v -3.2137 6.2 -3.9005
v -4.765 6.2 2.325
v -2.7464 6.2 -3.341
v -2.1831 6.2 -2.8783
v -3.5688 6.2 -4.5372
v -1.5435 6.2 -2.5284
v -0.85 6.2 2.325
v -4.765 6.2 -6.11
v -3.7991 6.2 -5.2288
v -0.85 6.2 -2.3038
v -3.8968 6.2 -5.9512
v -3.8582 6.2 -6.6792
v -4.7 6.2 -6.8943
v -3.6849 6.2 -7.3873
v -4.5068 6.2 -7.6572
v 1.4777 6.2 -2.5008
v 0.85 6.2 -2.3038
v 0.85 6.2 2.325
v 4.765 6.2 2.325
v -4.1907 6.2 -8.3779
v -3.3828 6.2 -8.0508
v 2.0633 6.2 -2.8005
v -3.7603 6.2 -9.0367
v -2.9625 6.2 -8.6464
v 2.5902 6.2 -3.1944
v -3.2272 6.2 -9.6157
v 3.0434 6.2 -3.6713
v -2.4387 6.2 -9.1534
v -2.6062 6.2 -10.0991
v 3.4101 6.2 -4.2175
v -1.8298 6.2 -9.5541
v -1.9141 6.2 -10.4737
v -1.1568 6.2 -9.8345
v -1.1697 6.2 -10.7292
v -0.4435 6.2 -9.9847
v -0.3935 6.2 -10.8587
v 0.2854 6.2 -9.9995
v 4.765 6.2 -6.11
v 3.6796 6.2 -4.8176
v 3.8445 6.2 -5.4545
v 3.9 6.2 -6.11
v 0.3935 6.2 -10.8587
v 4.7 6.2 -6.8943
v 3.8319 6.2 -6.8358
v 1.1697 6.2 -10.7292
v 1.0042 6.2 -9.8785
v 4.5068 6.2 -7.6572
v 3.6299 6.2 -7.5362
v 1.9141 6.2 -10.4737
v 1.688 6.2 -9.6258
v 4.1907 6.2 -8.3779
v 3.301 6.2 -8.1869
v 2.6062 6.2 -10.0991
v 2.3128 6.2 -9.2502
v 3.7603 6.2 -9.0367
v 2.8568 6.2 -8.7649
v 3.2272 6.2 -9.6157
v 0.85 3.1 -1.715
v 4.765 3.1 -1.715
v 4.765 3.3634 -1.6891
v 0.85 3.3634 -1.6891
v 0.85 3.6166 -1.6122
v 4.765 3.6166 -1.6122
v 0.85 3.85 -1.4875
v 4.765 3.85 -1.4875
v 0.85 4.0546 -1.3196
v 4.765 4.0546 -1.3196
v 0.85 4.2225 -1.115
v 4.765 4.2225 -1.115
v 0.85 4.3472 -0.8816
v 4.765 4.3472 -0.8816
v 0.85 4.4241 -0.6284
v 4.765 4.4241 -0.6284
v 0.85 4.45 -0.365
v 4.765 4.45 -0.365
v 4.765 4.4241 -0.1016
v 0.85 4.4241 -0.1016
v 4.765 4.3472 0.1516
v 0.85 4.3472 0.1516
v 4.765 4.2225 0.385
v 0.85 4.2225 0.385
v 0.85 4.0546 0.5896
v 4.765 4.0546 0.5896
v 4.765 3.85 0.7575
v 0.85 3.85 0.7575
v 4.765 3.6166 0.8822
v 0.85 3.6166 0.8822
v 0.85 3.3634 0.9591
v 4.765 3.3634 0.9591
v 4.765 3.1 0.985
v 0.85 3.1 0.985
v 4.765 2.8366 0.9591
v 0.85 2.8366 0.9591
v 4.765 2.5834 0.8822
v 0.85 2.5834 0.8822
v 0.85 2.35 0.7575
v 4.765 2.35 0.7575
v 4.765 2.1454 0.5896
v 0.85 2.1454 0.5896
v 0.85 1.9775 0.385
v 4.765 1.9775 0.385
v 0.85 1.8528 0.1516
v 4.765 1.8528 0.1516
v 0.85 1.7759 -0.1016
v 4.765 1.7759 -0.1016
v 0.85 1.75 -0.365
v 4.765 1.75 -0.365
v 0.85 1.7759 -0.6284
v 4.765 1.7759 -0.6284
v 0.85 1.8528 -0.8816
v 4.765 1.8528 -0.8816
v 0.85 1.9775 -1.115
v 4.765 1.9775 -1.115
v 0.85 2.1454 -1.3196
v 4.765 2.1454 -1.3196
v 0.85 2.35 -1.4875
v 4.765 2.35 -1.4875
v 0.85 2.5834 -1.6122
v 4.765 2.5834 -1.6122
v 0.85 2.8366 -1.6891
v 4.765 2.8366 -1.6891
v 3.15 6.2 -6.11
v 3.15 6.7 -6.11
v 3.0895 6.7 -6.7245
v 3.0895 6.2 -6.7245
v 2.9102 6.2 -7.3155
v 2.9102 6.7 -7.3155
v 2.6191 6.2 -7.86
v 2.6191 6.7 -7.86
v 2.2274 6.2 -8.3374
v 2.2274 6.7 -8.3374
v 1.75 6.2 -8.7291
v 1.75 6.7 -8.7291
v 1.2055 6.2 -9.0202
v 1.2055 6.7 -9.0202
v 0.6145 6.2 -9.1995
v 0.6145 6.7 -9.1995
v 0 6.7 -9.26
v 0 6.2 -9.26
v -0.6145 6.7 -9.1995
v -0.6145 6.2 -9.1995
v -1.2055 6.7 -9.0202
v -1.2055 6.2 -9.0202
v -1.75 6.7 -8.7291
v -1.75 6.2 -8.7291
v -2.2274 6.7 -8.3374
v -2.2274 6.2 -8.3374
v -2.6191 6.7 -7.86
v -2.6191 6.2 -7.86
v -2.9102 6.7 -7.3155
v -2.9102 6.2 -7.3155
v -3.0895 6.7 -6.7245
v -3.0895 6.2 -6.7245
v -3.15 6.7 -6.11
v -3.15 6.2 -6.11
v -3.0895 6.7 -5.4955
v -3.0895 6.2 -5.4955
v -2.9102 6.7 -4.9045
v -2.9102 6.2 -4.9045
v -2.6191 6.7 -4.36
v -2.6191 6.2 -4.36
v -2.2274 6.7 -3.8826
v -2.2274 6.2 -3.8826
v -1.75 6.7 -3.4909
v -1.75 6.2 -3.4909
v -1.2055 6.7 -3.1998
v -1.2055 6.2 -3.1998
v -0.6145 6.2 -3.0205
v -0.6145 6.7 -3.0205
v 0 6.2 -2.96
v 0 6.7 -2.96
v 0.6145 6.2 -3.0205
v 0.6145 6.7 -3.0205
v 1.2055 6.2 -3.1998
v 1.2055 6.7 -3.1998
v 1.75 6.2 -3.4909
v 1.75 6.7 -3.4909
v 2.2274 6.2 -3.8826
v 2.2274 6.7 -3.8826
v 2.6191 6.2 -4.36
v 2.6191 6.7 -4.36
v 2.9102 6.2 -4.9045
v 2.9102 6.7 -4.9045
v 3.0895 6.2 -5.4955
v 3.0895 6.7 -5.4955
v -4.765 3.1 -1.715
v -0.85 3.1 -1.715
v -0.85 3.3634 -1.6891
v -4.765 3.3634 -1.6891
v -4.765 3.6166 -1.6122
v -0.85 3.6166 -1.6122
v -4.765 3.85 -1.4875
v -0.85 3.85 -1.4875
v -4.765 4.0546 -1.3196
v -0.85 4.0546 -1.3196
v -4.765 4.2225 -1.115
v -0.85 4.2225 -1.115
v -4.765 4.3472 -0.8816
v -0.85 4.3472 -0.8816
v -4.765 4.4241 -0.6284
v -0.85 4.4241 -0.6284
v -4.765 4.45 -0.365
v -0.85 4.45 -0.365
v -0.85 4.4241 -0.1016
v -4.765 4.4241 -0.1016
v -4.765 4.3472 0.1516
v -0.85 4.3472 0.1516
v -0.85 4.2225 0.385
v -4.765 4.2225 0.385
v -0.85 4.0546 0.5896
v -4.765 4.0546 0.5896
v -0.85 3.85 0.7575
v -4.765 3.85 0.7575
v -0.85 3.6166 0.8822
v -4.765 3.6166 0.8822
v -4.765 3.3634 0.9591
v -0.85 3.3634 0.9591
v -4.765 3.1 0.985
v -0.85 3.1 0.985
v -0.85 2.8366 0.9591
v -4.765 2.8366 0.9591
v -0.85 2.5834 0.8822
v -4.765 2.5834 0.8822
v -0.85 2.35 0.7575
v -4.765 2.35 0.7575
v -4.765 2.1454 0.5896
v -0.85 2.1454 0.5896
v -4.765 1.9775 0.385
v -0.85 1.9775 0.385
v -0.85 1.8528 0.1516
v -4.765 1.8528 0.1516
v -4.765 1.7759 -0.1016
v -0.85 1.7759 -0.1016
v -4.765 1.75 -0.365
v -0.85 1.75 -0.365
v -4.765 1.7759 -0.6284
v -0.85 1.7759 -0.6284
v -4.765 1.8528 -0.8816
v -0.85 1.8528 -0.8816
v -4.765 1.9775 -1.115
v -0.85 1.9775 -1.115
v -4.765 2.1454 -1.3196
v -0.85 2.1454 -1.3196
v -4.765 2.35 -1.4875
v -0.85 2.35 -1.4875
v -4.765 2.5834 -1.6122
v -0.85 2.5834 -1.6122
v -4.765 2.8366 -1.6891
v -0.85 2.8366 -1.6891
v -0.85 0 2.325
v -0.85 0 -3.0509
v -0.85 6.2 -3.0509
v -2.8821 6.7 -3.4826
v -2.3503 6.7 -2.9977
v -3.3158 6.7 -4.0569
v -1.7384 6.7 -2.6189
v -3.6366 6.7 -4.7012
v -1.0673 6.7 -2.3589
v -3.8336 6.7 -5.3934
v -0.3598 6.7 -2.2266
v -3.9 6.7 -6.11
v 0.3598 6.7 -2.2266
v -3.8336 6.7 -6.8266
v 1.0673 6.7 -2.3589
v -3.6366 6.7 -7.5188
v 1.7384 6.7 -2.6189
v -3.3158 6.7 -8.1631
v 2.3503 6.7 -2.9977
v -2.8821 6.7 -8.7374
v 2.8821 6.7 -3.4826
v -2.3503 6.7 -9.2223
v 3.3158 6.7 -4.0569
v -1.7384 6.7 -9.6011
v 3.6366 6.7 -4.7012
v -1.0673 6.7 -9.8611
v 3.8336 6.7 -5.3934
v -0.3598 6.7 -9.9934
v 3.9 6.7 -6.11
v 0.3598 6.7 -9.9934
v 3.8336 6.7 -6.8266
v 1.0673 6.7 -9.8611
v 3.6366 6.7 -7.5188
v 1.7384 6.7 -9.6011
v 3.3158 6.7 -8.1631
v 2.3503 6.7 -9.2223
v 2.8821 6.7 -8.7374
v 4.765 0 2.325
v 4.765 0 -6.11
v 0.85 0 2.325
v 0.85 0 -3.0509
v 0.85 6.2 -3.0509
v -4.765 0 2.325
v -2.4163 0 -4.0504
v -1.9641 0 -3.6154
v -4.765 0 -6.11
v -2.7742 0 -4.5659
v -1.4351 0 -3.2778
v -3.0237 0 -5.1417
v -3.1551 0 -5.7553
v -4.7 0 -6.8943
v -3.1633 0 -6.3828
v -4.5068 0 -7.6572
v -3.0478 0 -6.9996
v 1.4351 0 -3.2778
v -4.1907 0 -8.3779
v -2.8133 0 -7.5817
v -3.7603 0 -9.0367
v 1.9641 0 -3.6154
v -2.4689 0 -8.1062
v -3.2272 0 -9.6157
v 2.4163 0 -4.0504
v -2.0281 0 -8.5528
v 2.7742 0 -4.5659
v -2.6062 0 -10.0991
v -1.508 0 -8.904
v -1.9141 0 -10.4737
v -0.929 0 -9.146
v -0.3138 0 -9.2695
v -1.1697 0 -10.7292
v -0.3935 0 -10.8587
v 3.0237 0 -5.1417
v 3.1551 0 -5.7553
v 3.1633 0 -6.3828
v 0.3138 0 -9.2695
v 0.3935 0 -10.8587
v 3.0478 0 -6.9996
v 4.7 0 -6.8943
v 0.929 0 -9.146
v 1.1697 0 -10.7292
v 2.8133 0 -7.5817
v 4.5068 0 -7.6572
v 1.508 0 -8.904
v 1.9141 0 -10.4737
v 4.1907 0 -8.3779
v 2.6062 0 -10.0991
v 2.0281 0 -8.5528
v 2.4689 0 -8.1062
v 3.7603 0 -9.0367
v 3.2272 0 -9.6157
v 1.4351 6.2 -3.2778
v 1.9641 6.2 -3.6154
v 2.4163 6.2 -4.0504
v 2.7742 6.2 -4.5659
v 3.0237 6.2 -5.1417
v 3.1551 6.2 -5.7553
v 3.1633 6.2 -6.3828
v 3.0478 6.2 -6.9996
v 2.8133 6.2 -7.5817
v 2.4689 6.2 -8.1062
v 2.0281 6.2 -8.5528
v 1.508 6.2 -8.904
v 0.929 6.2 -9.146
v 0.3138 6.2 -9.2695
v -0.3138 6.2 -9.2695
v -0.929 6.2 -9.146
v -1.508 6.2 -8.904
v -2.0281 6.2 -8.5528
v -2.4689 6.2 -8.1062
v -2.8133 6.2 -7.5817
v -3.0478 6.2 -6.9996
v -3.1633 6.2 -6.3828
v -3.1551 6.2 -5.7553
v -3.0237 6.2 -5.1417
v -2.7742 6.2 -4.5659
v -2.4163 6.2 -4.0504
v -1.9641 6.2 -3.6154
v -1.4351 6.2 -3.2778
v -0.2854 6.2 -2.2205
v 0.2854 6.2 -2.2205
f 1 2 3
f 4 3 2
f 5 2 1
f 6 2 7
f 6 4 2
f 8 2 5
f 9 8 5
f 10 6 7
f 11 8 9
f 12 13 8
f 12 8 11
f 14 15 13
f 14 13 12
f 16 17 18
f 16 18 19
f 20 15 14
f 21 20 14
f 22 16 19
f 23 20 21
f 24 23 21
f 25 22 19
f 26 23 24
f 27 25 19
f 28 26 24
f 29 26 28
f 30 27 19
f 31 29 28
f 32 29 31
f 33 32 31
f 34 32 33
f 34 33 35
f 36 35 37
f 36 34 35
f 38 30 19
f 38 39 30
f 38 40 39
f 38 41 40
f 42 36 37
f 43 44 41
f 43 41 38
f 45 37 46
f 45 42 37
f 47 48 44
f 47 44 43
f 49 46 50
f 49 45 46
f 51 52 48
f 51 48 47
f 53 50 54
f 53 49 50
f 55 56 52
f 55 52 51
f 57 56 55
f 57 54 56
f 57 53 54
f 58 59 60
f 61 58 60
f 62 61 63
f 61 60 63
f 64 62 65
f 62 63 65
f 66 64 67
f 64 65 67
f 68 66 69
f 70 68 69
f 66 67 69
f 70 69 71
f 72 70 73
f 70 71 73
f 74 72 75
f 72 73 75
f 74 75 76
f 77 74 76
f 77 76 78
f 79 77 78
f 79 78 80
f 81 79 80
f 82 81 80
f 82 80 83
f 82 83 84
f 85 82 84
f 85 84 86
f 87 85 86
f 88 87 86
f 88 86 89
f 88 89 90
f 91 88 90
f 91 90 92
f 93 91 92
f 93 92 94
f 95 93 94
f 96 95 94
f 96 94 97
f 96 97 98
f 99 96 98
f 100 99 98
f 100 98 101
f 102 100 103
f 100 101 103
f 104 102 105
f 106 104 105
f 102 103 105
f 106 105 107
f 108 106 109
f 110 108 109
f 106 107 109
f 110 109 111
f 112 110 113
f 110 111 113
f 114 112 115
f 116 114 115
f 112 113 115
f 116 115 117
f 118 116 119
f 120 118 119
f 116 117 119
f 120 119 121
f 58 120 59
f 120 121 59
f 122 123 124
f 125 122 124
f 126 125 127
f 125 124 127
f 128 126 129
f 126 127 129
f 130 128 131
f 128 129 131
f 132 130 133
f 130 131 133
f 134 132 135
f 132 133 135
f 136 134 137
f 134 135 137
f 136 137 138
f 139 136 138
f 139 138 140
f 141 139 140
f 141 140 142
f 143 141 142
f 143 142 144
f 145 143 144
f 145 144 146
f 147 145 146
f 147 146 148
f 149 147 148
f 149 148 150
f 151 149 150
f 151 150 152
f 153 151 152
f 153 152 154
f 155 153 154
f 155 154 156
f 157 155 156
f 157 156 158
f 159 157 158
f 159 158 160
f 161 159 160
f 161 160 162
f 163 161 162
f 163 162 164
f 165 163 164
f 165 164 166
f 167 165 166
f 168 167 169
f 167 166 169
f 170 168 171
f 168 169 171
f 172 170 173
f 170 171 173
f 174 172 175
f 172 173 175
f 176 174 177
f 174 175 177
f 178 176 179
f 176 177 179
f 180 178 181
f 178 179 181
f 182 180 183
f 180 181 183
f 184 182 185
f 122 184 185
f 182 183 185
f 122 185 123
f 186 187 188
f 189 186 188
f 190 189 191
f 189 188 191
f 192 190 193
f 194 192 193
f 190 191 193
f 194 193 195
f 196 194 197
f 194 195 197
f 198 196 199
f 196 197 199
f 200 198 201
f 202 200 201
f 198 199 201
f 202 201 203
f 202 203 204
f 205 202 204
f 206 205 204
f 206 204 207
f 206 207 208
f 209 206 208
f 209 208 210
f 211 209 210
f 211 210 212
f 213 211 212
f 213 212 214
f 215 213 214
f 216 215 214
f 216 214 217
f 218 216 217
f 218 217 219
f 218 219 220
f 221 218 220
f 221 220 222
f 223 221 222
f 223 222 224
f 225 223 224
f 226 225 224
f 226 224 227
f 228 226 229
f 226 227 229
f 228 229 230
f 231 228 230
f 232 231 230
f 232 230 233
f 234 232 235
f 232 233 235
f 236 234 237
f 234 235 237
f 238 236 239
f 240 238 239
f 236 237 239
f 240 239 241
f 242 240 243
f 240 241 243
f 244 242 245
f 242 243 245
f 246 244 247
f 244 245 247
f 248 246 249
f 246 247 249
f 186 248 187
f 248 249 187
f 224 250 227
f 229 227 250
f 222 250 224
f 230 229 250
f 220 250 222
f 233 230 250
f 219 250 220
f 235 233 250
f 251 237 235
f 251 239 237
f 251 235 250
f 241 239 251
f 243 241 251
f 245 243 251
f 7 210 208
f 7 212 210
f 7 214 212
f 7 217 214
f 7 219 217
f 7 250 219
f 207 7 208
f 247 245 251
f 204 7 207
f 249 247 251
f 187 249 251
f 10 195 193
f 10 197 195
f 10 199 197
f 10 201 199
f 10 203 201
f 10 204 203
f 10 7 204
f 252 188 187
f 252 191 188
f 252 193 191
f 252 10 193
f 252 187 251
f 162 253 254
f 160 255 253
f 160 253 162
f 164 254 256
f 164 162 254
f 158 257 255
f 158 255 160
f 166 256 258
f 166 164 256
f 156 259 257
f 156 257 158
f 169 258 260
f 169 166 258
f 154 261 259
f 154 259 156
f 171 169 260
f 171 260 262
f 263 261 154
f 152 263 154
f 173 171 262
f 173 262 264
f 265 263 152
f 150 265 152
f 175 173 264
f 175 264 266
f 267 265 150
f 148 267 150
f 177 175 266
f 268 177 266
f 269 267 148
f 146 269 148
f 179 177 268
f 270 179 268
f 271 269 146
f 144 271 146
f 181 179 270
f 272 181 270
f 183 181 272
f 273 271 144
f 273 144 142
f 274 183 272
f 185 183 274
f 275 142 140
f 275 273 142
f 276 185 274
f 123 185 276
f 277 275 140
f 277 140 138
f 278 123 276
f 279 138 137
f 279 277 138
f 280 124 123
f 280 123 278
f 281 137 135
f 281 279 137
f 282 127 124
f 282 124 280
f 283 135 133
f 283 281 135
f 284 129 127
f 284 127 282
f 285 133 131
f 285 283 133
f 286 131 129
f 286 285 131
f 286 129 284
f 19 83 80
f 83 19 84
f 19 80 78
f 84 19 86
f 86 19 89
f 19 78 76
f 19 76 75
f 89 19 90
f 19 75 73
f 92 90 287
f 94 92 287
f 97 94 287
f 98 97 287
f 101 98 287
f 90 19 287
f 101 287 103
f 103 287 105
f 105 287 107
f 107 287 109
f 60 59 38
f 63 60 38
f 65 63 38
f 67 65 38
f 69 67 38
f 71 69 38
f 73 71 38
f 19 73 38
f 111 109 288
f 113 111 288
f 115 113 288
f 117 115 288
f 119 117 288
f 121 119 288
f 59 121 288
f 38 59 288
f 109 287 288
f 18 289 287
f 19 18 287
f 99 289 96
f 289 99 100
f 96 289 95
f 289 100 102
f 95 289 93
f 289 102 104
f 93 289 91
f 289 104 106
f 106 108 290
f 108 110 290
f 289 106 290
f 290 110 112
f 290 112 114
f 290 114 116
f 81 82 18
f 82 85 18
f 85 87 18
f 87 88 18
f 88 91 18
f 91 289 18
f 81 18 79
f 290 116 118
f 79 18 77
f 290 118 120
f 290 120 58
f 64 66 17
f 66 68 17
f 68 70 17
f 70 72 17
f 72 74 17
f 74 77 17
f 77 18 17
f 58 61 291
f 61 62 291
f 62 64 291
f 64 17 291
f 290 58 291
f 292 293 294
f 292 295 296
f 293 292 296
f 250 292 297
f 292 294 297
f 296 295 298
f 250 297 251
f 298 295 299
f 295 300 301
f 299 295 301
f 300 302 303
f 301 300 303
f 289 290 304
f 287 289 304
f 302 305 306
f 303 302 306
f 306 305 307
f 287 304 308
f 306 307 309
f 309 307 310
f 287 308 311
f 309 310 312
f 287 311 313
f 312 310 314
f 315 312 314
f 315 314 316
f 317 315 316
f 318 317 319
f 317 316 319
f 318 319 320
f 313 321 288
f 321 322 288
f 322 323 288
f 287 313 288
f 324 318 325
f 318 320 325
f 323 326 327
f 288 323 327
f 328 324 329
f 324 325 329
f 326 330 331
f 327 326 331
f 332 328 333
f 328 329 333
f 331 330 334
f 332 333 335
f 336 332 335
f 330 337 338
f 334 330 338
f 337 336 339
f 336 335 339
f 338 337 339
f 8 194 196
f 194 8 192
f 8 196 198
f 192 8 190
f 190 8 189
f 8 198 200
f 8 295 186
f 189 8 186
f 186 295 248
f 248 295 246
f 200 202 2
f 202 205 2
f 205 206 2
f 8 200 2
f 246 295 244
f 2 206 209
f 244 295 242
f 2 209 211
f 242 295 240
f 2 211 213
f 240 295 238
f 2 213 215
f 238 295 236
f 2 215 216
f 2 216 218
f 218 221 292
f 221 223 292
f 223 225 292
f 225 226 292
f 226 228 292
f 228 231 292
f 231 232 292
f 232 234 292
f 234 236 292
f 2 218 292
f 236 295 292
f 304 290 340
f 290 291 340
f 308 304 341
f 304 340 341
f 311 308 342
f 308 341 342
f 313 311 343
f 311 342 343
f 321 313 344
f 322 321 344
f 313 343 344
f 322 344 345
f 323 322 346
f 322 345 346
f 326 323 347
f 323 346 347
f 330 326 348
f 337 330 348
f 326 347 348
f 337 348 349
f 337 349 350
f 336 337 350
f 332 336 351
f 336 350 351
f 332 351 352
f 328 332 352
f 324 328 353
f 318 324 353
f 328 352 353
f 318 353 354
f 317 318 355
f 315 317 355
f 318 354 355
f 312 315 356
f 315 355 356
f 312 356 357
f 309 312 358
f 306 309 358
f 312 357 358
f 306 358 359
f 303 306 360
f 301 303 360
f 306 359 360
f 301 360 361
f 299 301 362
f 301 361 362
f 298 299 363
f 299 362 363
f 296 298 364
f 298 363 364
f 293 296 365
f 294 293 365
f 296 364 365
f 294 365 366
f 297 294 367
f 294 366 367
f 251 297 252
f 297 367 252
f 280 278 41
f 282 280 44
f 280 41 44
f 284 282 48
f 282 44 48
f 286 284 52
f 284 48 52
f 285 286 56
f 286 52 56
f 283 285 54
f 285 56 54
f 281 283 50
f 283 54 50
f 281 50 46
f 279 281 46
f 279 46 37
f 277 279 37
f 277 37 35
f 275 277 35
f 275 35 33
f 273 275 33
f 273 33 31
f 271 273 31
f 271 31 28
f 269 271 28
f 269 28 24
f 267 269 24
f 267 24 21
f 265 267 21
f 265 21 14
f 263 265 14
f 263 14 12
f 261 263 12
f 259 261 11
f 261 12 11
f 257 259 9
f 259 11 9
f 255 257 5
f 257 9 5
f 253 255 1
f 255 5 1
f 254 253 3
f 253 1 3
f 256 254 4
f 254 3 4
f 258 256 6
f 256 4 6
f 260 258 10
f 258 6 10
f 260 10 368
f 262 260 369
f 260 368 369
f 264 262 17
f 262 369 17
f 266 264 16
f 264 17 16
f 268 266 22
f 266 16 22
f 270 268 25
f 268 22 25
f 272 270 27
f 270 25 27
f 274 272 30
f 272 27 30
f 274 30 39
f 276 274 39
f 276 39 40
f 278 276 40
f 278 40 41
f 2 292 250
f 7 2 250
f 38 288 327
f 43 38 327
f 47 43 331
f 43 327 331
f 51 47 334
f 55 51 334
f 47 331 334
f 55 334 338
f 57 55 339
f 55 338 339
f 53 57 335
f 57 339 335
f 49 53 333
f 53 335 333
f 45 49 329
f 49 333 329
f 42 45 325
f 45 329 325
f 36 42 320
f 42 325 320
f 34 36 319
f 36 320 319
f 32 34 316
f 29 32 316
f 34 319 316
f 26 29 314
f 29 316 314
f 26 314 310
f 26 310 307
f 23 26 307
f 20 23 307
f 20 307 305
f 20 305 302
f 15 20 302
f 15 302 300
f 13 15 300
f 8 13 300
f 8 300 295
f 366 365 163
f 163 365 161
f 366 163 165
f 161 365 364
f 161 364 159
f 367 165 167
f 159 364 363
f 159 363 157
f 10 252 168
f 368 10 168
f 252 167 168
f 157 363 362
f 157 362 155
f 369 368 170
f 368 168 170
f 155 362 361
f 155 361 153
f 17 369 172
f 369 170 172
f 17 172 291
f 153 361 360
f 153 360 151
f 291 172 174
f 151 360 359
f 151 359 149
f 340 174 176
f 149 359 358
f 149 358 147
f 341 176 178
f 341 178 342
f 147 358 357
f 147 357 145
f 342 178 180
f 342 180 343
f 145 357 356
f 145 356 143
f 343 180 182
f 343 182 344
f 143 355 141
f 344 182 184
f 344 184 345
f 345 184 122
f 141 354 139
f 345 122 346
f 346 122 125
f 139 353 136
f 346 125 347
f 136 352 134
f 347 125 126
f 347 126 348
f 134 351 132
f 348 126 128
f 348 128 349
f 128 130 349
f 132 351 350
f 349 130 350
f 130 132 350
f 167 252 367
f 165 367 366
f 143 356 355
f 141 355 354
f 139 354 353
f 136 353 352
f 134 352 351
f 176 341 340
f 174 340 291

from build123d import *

# Parameters (mm, degrees)
CROQUIS1_R              = 4.765
CROQUIS1_W              = 9.53
CROQUIS1_H              = 4.65
SALIENTE_EXTRUIR1_DEPTH = 6.2
CROQUIS2_R              = 3.175
CORTAR_EXTRUIR1_DEPTH   = 6.2
CROQUIS3_W              = 1.7
CROQUIS3_H              = 5.8
CORTAR_EXTRUIR2_DEPTH   = 6.2
CROQUIS4_R              = 1.35
CORTAR_EXTRUIR3_DEPTH   = 10.53
CROQUIS5_R              = 3.9
SALIENTE_EXTRUIR2_DEPTH = 0.5
CROQUIS6_R              = 3.15
CORTAR_EXTRUIR4_DEPTH   = 7.7


with BuildPart() as part:
    # Croquis1 → Saliente-Extruir1 (new body)
    with BuildSketch(Plane(origin=(0, 0, 0), x_dir=(1, 0, 0), z_dir=(0, 1, 0))):
        with Locations((0, 6.11)):
            Circle(CROQUIS1_R)
        Rectangle(CROQUIS1_W, CROQUIS1_H)
        with BuildLine():
            ThreePointArc((4.765, 6.11), (0, 10.875), (-4.765, 6.11))
            ThreePointArc((-4.765, 6.11), (-4.271898488, 3.999050378), (-2.894650238, 2.325))
            Line((-2.894650238, 2.325), (2.894650238, 2.325))
            ThreePointArc((2.894650238, 2.325), (4.271898488, 3.999050378), (4.765, 6.11))
        make_face()
        with BuildLine():
            Line((2.894650238, 2.325), (-2.894650238, 2.325))
            ThreePointArc((-2.894650238, 2.325), (0, 1.345), (2.894650238, 2.325))
        make_face()
        with BuildLine():
            Line((-4.765, 6.11), (-4.765, 2.325))
            Line((-4.765, 2.325), (-2.894650238, 2.325))
            ThreePointArc((-2.894650238, 2.325), (-4.271898488, 3.999050378), (-4.765, 6.11))
        make_face()
        with BuildLine():
            Line((4.765, 2.325), (4.765, 6.11))
            ThreePointArc((4.765, 6.11), (4.271898488, 3.999050378), (2.894650238, 2.325))
            Line((2.894650238, 2.325), (4.765, 2.325))
        make_face()
    extrude(amount=SALIENTE_EXTRUIR1_DEPTH)

    # Croquis2 → Cortar-Extruir1 (cut)
    with BuildSketch(Plane(origin=(0, 6.2, 0), x_dir=(1, 0, 0), z_dir=(0, 1, 0))):
        with Locations((0, 6.11)):
            Circle(CROQUIS2_R)
    extrude(amount=-CORTAR_EXTRUIR1_DEPTH, mode=Mode.SUBTRACT)

    # Croquis3 → Cortar-Extruir2 (cut)
    with BuildSketch(Plane(origin=(0, 6.2, 0), x_dir=(1, 0, 0), z_dir=(0, 1, 0))):
        with Locations((0, 0.575)):
            Rectangle(CROQUIS3_W, CROQUIS3_H)
    extrude(amount=-CORTAR_EXTRUIR2_DEPTH, mode=Mode.SUBTRACT)

    # Croquis4 → Cortar-Extruir3 (cut, through all)
    with BuildSketch(Plane(origin=(4.765, 0, 0), x_dir=(0, 0, -1), z_dir=(1, 0, 0))):
        with Locations((0.365, 3.1)):
            Circle(CROQUIS4_R)
    extrude(amount=-CORTAR_EXTRUIR3_DEPTH, mode=Mode.SUBTRACT)

    # Croquis5 → Saliente-Extruir2 (add)
    with BuildSketch(Plane(origin=(0, 6.2, 0), x_dir=(1, 0, 0), z_dir=(0, 1, 0))):
        with Locations((0, 6.11)):
            Circle(CROQUIS5_R)
    extrude(amount=SALIENTE_EXTRUIR2_DEPTH)

    # Croquis6 → Cortar-Extruir4 (cut, through all)
    with BuildSketch(Plane(origin=(0, 6.7, 0), x_dir=(1, 0, 0), z_dir=(0, 1, 0))):
        with Locations((0, 6.11)):
            Circle(CROQUIS6_R)
    extrude(amount=-CORTAR_EXTRUIR4_DEPTH, mode=Mode.SUBTRACT)


solid = part.part
